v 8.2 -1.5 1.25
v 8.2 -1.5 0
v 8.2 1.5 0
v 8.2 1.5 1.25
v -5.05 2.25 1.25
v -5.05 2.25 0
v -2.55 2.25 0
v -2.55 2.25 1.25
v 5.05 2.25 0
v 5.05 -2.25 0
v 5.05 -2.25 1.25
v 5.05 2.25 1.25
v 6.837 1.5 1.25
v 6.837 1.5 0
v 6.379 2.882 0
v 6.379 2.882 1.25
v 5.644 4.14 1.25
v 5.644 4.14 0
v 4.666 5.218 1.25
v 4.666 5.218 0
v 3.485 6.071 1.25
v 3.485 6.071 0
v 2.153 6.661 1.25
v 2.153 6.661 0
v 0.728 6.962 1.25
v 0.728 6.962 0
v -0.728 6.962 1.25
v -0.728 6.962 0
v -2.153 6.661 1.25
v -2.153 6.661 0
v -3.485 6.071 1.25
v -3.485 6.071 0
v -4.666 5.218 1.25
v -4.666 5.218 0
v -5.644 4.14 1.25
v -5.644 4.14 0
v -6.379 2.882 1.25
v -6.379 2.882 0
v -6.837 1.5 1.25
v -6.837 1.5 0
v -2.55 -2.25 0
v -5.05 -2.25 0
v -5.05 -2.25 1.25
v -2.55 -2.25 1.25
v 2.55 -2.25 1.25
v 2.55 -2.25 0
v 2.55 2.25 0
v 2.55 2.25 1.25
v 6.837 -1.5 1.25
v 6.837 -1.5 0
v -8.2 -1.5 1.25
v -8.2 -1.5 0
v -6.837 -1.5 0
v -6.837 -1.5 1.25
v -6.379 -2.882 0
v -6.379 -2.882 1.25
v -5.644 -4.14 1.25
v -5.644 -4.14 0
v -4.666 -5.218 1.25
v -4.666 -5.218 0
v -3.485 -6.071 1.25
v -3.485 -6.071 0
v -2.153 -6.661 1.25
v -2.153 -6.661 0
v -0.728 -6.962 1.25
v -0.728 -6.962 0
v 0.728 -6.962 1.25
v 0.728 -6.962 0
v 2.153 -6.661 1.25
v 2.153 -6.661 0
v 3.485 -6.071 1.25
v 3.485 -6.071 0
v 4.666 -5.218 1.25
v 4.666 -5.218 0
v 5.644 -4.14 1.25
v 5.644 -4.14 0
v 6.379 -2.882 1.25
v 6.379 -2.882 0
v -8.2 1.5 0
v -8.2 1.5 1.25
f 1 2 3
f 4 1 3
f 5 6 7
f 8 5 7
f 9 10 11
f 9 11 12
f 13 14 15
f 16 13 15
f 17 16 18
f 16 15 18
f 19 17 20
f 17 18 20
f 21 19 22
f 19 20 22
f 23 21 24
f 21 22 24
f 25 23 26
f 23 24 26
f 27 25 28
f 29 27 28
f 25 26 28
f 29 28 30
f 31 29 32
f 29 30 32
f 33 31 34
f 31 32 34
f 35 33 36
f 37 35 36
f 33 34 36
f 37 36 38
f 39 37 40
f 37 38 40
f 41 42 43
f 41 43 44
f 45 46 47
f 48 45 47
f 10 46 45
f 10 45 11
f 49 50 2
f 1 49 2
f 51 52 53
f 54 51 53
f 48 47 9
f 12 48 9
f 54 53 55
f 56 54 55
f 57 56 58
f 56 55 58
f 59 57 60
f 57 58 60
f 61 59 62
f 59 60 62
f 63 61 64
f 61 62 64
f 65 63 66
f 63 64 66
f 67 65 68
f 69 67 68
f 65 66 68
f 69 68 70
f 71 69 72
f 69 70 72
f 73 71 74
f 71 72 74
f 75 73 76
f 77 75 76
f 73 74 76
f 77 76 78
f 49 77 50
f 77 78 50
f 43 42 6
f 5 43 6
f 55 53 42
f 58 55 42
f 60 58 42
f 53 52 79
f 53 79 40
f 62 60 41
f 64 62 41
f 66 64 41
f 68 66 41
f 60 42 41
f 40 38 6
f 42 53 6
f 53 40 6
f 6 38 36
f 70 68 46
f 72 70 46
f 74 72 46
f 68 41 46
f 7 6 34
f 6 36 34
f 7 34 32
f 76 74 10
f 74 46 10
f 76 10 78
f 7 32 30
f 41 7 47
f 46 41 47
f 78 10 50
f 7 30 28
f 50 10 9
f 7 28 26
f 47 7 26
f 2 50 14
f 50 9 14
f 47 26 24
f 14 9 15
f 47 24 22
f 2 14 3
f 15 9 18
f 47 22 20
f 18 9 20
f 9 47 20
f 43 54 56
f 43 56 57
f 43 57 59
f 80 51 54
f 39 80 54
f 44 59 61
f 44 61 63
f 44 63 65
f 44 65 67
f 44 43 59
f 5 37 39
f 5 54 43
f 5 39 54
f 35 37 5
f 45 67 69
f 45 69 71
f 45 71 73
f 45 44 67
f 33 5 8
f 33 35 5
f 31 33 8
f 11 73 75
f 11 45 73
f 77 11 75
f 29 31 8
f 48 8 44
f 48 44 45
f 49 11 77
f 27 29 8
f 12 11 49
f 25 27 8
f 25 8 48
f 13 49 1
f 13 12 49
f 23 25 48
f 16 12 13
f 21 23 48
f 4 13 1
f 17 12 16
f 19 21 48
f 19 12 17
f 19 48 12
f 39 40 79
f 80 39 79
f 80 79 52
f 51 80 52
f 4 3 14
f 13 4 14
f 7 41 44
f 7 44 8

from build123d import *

# Parameters (mm, degrees)
F0_W     = 2.5
F0_H     = 4.5
F1_DEPTH = 1.25


with BuildPart() as f1:
    # F0 (on Top) → F1 (new body)
    with BuildSketch(Plane.XY):
        with BuildLine():
            Line((8.2, 1.5), (6.837397, 1.5))
            ThreePointArc((6.837397, 1.5), (0, 7), (-6.837397, 1.5))
            Line((-6.837397, 1.5), (-8.2, 1.5))
            Line((-8.2, 1.5), (-8.2, -1.5))
            Line((-8.2, -1.5), (-6.837397, -1.5))
            ThreePointArc((-6.837397, -1.5), (0, -7), (6.837397, -1.5))
            Line((6.837397, -1.5), (8.2, -1.5))
            Line((8.2, -1.5), (8.2, 1.5))
        make_face()
        with Locations((-3.8, 0)):
            Rectangle(F0_W, F0_H, mode=Mode.SUBTRACT)
        with Locations((3.8, 0)):
            Rectangle(F0_W, F0_H, mode=Mode.SUBTRACT)
    extrude(amount=F1_DEPTH)


solid = f1.part
